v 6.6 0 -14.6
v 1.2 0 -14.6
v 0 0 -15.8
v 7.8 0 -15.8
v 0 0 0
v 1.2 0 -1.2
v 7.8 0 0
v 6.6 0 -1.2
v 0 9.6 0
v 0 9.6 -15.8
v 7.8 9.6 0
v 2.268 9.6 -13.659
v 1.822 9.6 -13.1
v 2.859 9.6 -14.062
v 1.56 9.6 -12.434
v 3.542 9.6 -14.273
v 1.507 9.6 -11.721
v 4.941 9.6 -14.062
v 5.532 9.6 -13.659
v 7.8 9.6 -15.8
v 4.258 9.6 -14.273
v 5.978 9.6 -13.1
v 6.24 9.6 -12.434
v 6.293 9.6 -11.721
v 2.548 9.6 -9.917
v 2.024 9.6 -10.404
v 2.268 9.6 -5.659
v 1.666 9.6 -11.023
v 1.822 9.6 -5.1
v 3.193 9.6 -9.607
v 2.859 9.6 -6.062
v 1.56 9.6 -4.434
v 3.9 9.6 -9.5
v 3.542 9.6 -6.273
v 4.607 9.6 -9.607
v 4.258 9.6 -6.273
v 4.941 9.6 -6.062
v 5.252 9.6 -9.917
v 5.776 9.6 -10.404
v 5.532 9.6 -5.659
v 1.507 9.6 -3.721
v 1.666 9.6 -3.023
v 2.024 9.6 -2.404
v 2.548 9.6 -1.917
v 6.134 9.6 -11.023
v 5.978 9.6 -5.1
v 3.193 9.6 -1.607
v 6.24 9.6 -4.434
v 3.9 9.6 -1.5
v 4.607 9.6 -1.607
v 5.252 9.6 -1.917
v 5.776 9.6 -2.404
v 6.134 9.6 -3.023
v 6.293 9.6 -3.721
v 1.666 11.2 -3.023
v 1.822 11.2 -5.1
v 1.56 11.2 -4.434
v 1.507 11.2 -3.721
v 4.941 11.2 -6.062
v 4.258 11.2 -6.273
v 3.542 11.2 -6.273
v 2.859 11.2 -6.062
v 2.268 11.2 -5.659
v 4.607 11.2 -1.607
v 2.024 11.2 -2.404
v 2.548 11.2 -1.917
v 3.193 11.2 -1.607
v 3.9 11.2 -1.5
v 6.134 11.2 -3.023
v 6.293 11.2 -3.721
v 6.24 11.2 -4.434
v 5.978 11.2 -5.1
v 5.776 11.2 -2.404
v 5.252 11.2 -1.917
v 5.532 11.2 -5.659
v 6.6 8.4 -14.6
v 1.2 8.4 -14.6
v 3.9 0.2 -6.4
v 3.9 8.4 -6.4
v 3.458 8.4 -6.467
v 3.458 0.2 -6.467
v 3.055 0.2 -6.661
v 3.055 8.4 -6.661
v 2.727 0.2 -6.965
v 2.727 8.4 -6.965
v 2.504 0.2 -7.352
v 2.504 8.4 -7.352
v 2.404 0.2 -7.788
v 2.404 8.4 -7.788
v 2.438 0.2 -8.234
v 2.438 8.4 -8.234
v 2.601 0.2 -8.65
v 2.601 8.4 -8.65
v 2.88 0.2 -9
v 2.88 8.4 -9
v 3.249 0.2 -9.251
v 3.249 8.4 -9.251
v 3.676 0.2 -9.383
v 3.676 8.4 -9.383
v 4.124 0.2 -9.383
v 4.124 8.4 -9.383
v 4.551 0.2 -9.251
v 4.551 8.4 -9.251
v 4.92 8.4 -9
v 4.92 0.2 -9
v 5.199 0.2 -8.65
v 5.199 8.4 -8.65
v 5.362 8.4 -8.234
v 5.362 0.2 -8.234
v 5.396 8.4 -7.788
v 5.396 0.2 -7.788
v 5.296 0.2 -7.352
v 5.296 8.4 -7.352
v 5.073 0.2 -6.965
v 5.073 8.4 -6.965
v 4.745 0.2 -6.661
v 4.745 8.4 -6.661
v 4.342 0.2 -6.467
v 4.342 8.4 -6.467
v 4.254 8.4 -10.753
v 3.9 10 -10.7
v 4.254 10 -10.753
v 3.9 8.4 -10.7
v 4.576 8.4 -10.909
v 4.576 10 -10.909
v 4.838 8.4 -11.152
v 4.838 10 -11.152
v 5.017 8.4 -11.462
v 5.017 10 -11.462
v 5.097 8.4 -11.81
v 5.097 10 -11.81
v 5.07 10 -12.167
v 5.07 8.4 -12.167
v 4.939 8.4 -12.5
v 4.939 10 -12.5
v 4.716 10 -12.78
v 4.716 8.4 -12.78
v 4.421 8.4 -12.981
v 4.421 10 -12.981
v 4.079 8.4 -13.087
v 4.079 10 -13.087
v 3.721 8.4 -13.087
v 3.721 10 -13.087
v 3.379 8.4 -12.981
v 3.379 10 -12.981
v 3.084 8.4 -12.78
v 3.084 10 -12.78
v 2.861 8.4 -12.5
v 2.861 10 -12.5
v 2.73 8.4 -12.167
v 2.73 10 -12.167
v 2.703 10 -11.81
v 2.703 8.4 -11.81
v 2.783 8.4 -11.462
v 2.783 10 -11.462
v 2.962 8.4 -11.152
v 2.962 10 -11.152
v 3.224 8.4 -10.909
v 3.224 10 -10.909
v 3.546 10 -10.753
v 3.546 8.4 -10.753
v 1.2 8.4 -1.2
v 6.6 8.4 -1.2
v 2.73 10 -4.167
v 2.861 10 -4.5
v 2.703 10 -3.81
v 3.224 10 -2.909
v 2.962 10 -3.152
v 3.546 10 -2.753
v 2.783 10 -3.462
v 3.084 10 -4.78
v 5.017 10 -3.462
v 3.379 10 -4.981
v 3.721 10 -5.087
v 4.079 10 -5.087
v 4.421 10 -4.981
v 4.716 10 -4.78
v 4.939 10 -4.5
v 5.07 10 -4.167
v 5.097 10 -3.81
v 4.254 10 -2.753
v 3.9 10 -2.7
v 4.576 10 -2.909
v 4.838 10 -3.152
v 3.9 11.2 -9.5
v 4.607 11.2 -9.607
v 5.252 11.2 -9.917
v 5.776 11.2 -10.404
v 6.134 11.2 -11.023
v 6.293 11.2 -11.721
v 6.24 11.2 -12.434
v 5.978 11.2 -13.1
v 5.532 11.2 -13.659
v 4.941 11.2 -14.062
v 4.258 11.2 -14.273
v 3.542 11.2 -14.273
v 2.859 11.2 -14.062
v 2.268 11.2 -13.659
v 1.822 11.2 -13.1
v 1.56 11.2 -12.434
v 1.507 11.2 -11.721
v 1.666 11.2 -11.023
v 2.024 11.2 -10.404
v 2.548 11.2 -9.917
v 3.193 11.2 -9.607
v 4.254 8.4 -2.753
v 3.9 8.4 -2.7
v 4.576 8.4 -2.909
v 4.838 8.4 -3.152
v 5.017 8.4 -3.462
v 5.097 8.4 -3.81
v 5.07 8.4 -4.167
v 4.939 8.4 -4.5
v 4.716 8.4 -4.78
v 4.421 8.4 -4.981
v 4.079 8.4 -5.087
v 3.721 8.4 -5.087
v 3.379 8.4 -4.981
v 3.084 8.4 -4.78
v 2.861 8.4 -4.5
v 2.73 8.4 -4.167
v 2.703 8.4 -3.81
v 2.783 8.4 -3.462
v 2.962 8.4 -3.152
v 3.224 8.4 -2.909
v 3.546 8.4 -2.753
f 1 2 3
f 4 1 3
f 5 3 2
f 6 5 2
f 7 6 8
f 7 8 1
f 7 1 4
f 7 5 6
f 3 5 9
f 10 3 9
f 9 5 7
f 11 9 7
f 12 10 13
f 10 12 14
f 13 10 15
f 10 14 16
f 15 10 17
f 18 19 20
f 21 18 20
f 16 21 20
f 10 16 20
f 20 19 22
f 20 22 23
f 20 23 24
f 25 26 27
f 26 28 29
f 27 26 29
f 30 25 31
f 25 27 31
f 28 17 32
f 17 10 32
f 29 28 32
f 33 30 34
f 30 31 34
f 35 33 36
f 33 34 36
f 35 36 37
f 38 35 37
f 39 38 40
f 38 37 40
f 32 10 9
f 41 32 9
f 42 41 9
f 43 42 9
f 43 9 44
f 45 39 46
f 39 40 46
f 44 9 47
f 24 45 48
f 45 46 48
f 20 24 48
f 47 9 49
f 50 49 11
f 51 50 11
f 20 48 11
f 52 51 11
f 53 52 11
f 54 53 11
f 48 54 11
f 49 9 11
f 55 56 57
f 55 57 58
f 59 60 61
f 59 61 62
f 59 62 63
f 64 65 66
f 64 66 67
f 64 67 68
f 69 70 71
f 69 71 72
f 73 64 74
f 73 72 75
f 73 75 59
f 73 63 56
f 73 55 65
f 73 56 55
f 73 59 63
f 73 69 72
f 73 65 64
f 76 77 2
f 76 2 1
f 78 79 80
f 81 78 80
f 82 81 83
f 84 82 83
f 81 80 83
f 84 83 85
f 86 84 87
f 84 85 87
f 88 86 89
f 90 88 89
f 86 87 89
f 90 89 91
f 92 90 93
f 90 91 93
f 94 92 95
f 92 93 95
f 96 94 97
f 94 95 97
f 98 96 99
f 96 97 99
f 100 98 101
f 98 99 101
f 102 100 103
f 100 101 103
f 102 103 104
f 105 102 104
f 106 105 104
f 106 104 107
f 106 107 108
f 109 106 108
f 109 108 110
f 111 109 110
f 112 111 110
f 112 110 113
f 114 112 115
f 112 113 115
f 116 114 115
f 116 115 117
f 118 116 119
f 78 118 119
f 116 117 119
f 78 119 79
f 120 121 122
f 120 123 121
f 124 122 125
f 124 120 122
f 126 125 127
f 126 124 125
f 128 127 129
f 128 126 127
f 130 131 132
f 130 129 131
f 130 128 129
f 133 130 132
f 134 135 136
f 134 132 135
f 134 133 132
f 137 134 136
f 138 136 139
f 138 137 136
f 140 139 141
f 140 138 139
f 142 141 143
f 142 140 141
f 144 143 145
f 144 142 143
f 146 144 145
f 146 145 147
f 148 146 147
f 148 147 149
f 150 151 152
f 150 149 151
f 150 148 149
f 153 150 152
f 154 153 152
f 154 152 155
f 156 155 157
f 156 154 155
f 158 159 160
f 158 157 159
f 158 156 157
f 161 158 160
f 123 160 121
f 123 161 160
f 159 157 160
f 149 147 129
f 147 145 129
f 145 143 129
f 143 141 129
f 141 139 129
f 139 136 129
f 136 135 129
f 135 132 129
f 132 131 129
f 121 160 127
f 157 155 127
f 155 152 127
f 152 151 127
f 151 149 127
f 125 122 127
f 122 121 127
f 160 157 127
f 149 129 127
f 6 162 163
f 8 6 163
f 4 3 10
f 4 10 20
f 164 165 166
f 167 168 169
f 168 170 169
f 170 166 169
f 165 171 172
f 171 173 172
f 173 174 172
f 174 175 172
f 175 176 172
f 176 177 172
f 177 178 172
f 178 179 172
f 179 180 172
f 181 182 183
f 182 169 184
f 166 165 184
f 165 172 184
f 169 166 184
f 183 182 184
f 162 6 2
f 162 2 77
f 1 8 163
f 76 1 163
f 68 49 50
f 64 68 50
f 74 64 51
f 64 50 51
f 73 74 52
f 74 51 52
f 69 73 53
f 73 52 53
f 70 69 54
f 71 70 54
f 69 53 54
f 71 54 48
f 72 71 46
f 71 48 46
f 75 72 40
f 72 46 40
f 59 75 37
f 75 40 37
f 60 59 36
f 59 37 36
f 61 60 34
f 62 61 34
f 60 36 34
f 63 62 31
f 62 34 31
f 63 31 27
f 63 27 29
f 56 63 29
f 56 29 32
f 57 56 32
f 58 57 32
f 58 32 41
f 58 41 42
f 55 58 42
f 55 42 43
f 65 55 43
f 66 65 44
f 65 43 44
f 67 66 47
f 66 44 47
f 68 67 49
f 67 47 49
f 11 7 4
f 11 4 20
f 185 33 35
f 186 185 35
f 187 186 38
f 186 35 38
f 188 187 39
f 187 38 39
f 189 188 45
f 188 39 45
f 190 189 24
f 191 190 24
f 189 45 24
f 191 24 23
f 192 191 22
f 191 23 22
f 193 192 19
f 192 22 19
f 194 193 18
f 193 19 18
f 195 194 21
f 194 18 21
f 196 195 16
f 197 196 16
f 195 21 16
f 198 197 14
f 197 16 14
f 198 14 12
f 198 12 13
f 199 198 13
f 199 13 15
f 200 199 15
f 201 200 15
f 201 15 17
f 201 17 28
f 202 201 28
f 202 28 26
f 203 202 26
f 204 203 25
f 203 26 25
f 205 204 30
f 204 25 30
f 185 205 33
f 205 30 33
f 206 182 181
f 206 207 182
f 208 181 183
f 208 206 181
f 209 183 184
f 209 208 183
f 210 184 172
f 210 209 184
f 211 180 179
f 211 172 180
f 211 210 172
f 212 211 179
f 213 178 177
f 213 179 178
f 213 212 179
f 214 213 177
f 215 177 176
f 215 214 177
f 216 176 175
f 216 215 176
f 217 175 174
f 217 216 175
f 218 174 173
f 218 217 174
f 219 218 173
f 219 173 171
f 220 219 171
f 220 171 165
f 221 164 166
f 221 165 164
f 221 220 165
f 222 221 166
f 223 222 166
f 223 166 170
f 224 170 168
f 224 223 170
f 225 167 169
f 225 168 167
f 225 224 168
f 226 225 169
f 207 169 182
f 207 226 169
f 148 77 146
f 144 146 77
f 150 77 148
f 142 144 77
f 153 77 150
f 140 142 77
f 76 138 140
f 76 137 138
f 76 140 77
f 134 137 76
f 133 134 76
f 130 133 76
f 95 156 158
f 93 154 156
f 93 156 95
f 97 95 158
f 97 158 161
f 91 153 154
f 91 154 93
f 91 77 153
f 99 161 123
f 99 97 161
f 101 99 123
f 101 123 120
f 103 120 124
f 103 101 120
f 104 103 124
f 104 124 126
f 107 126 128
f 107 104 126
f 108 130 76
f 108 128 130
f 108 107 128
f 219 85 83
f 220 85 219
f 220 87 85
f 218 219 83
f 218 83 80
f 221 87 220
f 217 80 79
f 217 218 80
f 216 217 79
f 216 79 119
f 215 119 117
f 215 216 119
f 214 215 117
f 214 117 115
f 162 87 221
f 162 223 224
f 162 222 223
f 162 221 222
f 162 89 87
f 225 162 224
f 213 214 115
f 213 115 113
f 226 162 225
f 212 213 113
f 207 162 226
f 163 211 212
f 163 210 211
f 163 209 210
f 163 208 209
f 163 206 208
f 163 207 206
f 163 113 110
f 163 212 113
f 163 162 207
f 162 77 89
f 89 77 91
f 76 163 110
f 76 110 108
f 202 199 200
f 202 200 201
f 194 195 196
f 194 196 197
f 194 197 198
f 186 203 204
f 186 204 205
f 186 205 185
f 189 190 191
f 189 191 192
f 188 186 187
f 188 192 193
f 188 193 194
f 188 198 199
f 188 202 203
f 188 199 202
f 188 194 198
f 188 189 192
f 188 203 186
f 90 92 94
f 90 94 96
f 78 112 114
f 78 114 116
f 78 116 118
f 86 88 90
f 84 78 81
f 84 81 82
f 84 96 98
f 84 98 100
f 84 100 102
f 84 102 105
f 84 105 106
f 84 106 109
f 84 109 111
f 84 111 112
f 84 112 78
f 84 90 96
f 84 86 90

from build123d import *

# Parameters (mm, degrees)
SKETCH1_W            = 7.8
SKETCH1_H            = 9.6
BOSS_EXTRUDE1_DEPTH  = 15.8
SKETCH2_R            = 2.4
BOSS_EXTRUDE2_DEPTH  = 1.6
LPATTERN1_COUNT      = 2
LPATTERN1_PITCH      = 8
LPATTERN1_COUNT_DIR2 = 4
LPATTERN1_PITCH_DIR2 = 8
SHELL1_T             = -1.2
SKETCH5_R            = 1.5
BOSS_EXTRUDE4_DEPTH  = 8.2


with BuildPart() as part:
    # Sketch1 → Boss-Extrude1 (new body)
    with BuildSketch(Plane.XY):
        with Locations((3.9, 4.8)):
            Rectangle(SKETCH1_W, SKETCH1_H)
    extrude(amount=-BOSS_EXTRUDE1_DEPTH)

    # Sketch2 → Boss-Extrude2 (add)
    with BuildSketch(Plane(origin=(0, 9.6, 0), x_dir=(1, 0, 0), z_dir=(0, 1, 0))):
        with Locations(Location((3.9, 3.9, 0), (0, 0, 270))):
            Circle(SKETCH2_R)
    boss_extrude2 = extrude(amount=BOSS_EXTRUDE2_DEPTH)

    # LPattern1: Boss-Extrude2 2 × 4, 6 skipped
    with Locations(*[(-j * LPATTERN1_PITCH_DIR2, 0, -i * LPATTERN1_PITCH) for i in range(LPATTERN1_COUNT) for j in range(LPATTERN1_COUNT_DIR2) if (i, j) not in ((0, 0), (0, 1), (0, 2), (0, 3), (1, 1), (1, 2), (1, 3))]):
        add(boss_extrude2)

    # Shell1
    shell1_openings = [part.faces().sort_by_distance(p)[0] for p in [
        (3.9, 0, -7.9),
    ]]
    offset(amount=SHELL1_T, openings=shell1_openings, kind=Kind.INTERSECTION)

    # Sketch5 → Boss-Extrude4 (add)
    with BuildSketch(Plane.XZ.offset(-8.4)):
        with Locations(Location((3.9, -7.9, 0), (0, 0, 90))):
            Circle(SKETCH5_R)
    extrude(amount=BOSS_EXTRUDE4_DEPTH)


solid = part.part
